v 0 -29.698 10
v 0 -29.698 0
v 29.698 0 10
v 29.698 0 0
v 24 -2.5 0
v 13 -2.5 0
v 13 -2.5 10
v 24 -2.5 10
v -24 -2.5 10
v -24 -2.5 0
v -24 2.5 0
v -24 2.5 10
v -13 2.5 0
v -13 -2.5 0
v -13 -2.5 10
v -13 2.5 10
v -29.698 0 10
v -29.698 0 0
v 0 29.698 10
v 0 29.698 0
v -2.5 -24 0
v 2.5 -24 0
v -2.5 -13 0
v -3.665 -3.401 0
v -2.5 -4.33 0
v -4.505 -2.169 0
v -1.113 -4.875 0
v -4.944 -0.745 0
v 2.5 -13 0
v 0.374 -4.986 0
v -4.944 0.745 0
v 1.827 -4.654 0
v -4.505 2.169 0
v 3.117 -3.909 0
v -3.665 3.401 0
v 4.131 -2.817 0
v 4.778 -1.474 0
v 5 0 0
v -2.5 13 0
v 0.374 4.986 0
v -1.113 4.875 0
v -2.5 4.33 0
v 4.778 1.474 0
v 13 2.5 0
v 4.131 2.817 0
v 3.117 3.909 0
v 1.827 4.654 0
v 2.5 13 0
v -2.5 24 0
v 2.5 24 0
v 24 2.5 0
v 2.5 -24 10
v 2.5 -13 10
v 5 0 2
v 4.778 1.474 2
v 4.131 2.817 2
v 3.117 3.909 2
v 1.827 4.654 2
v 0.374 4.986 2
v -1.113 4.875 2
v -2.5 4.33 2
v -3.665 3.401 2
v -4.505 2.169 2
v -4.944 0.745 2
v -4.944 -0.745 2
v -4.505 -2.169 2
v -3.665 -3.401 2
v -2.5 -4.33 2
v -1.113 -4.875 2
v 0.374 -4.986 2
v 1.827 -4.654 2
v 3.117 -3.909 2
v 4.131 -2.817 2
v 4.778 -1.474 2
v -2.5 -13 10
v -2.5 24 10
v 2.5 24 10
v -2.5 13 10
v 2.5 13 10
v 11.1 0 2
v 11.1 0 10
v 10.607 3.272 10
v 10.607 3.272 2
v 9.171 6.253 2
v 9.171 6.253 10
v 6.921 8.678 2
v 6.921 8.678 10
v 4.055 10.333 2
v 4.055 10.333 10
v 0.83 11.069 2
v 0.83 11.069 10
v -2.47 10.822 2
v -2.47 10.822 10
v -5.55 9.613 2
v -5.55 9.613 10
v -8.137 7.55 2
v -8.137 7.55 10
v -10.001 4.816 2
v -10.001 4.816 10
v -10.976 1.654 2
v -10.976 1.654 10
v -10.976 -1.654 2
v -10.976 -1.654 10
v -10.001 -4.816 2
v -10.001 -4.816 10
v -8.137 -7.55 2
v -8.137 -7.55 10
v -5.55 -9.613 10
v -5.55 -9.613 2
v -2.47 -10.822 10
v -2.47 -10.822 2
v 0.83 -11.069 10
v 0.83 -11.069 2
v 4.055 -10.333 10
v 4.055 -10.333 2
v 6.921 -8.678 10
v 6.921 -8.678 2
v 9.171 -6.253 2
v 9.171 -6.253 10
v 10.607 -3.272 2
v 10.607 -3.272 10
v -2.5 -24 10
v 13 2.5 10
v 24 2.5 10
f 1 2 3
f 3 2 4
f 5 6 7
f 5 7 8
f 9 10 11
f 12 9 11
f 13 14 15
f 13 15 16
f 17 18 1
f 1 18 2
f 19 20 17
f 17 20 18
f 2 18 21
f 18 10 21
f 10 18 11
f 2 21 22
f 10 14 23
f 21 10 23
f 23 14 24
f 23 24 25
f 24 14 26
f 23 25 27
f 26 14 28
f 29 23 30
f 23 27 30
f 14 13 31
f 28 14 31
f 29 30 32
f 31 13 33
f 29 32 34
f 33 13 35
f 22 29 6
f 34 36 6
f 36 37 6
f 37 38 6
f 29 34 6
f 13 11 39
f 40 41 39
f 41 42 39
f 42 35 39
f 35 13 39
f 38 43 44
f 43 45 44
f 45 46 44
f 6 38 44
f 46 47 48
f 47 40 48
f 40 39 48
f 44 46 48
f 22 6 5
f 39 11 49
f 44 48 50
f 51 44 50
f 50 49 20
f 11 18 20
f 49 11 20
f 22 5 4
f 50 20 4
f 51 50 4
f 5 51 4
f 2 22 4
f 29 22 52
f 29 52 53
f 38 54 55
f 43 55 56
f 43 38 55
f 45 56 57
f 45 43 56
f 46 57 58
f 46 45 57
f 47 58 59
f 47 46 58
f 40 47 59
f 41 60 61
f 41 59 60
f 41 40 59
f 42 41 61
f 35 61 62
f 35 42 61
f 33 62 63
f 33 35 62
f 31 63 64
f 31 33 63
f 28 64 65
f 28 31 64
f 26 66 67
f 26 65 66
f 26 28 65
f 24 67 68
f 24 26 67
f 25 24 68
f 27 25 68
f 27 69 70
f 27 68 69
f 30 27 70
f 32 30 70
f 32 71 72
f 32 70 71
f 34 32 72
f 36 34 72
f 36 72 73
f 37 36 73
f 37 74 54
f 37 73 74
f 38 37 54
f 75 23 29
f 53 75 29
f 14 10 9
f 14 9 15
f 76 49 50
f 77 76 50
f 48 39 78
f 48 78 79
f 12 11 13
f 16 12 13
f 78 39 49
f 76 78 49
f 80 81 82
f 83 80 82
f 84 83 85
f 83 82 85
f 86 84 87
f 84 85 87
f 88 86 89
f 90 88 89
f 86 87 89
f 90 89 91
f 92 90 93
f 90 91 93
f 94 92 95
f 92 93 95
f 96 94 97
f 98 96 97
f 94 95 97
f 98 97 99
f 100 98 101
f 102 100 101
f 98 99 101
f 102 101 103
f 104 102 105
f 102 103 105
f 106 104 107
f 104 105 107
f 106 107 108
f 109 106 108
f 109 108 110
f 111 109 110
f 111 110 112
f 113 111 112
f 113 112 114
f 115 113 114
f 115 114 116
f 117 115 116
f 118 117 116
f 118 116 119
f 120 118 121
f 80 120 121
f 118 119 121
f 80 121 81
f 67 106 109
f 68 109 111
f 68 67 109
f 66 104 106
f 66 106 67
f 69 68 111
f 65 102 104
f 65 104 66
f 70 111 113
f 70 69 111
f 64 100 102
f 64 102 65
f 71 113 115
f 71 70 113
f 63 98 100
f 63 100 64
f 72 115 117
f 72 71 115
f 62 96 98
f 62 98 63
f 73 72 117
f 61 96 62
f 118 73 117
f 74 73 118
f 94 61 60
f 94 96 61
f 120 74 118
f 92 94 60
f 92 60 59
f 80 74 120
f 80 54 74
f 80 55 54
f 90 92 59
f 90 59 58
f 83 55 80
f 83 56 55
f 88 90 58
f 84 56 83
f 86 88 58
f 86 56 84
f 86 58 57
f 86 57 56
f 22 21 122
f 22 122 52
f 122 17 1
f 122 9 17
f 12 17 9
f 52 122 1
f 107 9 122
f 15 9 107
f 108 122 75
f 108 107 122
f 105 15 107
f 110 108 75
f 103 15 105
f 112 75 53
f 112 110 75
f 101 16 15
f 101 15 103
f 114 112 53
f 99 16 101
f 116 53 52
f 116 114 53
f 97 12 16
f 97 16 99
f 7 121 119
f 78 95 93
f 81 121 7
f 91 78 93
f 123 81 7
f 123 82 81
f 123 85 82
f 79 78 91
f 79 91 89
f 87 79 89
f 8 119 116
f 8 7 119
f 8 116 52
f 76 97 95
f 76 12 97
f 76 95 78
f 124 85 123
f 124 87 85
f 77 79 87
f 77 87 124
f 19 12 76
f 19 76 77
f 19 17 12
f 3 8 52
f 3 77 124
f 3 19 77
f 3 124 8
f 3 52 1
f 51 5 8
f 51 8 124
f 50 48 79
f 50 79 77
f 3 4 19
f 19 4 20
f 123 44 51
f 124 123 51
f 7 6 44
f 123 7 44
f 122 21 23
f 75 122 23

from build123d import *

# Parameters (mm, degrees)
SKETCH_R     = 5
SKETCH_W     = 11
SKETCH_H     = 5
SKETCH_W_2   = 5
SKETCH_H_2   = 11
PAD_DEPTH    = 10
SKETCH001_R  = 11.1
POCKET_DEPTH = 8


with BuildPart() as part:
    # Sketch → Pad (new body)
    with BuildSketch(Plane.XY):
        Polygon((29.698485, 0), (0, 29.698485), (-29.698485, 0), (0, -29.698485), align=None)
        Circle(SKETCH_R, mode=Mode.SUBTRACT)
        with Locations((-18.5, 0)):
            Rectangle(SKETCH_W, SKETCH_H, mode=Mode.SUBTRACT)
        with Locations((0, 18.5)):
            Rectangle(SKETCH_W_2, SKETCH_H_2, mode=Mode.SUBTRACT)
        with Locations((0, -18.5)):
            Rectangle(SKETCH_W_2, SKETCH_H_2, mode=Mode.SUBTRACT)
        with Locations((18.5, 0)):
            Rectangle(SKETCH_W, SKETCH_H, mode=Mode.SUBTRACT)
    extrude(amount=PAD_DEPTH)

    # Sketch001 → Pocket (cut)
    with BuildSketch(Plane.XY.offset(10)):
        Circle(SKETCH001_R)
    extrude(amount=-POCKET_DEPTH, mode=Mode.SUBTRACT)


solid = part.part
